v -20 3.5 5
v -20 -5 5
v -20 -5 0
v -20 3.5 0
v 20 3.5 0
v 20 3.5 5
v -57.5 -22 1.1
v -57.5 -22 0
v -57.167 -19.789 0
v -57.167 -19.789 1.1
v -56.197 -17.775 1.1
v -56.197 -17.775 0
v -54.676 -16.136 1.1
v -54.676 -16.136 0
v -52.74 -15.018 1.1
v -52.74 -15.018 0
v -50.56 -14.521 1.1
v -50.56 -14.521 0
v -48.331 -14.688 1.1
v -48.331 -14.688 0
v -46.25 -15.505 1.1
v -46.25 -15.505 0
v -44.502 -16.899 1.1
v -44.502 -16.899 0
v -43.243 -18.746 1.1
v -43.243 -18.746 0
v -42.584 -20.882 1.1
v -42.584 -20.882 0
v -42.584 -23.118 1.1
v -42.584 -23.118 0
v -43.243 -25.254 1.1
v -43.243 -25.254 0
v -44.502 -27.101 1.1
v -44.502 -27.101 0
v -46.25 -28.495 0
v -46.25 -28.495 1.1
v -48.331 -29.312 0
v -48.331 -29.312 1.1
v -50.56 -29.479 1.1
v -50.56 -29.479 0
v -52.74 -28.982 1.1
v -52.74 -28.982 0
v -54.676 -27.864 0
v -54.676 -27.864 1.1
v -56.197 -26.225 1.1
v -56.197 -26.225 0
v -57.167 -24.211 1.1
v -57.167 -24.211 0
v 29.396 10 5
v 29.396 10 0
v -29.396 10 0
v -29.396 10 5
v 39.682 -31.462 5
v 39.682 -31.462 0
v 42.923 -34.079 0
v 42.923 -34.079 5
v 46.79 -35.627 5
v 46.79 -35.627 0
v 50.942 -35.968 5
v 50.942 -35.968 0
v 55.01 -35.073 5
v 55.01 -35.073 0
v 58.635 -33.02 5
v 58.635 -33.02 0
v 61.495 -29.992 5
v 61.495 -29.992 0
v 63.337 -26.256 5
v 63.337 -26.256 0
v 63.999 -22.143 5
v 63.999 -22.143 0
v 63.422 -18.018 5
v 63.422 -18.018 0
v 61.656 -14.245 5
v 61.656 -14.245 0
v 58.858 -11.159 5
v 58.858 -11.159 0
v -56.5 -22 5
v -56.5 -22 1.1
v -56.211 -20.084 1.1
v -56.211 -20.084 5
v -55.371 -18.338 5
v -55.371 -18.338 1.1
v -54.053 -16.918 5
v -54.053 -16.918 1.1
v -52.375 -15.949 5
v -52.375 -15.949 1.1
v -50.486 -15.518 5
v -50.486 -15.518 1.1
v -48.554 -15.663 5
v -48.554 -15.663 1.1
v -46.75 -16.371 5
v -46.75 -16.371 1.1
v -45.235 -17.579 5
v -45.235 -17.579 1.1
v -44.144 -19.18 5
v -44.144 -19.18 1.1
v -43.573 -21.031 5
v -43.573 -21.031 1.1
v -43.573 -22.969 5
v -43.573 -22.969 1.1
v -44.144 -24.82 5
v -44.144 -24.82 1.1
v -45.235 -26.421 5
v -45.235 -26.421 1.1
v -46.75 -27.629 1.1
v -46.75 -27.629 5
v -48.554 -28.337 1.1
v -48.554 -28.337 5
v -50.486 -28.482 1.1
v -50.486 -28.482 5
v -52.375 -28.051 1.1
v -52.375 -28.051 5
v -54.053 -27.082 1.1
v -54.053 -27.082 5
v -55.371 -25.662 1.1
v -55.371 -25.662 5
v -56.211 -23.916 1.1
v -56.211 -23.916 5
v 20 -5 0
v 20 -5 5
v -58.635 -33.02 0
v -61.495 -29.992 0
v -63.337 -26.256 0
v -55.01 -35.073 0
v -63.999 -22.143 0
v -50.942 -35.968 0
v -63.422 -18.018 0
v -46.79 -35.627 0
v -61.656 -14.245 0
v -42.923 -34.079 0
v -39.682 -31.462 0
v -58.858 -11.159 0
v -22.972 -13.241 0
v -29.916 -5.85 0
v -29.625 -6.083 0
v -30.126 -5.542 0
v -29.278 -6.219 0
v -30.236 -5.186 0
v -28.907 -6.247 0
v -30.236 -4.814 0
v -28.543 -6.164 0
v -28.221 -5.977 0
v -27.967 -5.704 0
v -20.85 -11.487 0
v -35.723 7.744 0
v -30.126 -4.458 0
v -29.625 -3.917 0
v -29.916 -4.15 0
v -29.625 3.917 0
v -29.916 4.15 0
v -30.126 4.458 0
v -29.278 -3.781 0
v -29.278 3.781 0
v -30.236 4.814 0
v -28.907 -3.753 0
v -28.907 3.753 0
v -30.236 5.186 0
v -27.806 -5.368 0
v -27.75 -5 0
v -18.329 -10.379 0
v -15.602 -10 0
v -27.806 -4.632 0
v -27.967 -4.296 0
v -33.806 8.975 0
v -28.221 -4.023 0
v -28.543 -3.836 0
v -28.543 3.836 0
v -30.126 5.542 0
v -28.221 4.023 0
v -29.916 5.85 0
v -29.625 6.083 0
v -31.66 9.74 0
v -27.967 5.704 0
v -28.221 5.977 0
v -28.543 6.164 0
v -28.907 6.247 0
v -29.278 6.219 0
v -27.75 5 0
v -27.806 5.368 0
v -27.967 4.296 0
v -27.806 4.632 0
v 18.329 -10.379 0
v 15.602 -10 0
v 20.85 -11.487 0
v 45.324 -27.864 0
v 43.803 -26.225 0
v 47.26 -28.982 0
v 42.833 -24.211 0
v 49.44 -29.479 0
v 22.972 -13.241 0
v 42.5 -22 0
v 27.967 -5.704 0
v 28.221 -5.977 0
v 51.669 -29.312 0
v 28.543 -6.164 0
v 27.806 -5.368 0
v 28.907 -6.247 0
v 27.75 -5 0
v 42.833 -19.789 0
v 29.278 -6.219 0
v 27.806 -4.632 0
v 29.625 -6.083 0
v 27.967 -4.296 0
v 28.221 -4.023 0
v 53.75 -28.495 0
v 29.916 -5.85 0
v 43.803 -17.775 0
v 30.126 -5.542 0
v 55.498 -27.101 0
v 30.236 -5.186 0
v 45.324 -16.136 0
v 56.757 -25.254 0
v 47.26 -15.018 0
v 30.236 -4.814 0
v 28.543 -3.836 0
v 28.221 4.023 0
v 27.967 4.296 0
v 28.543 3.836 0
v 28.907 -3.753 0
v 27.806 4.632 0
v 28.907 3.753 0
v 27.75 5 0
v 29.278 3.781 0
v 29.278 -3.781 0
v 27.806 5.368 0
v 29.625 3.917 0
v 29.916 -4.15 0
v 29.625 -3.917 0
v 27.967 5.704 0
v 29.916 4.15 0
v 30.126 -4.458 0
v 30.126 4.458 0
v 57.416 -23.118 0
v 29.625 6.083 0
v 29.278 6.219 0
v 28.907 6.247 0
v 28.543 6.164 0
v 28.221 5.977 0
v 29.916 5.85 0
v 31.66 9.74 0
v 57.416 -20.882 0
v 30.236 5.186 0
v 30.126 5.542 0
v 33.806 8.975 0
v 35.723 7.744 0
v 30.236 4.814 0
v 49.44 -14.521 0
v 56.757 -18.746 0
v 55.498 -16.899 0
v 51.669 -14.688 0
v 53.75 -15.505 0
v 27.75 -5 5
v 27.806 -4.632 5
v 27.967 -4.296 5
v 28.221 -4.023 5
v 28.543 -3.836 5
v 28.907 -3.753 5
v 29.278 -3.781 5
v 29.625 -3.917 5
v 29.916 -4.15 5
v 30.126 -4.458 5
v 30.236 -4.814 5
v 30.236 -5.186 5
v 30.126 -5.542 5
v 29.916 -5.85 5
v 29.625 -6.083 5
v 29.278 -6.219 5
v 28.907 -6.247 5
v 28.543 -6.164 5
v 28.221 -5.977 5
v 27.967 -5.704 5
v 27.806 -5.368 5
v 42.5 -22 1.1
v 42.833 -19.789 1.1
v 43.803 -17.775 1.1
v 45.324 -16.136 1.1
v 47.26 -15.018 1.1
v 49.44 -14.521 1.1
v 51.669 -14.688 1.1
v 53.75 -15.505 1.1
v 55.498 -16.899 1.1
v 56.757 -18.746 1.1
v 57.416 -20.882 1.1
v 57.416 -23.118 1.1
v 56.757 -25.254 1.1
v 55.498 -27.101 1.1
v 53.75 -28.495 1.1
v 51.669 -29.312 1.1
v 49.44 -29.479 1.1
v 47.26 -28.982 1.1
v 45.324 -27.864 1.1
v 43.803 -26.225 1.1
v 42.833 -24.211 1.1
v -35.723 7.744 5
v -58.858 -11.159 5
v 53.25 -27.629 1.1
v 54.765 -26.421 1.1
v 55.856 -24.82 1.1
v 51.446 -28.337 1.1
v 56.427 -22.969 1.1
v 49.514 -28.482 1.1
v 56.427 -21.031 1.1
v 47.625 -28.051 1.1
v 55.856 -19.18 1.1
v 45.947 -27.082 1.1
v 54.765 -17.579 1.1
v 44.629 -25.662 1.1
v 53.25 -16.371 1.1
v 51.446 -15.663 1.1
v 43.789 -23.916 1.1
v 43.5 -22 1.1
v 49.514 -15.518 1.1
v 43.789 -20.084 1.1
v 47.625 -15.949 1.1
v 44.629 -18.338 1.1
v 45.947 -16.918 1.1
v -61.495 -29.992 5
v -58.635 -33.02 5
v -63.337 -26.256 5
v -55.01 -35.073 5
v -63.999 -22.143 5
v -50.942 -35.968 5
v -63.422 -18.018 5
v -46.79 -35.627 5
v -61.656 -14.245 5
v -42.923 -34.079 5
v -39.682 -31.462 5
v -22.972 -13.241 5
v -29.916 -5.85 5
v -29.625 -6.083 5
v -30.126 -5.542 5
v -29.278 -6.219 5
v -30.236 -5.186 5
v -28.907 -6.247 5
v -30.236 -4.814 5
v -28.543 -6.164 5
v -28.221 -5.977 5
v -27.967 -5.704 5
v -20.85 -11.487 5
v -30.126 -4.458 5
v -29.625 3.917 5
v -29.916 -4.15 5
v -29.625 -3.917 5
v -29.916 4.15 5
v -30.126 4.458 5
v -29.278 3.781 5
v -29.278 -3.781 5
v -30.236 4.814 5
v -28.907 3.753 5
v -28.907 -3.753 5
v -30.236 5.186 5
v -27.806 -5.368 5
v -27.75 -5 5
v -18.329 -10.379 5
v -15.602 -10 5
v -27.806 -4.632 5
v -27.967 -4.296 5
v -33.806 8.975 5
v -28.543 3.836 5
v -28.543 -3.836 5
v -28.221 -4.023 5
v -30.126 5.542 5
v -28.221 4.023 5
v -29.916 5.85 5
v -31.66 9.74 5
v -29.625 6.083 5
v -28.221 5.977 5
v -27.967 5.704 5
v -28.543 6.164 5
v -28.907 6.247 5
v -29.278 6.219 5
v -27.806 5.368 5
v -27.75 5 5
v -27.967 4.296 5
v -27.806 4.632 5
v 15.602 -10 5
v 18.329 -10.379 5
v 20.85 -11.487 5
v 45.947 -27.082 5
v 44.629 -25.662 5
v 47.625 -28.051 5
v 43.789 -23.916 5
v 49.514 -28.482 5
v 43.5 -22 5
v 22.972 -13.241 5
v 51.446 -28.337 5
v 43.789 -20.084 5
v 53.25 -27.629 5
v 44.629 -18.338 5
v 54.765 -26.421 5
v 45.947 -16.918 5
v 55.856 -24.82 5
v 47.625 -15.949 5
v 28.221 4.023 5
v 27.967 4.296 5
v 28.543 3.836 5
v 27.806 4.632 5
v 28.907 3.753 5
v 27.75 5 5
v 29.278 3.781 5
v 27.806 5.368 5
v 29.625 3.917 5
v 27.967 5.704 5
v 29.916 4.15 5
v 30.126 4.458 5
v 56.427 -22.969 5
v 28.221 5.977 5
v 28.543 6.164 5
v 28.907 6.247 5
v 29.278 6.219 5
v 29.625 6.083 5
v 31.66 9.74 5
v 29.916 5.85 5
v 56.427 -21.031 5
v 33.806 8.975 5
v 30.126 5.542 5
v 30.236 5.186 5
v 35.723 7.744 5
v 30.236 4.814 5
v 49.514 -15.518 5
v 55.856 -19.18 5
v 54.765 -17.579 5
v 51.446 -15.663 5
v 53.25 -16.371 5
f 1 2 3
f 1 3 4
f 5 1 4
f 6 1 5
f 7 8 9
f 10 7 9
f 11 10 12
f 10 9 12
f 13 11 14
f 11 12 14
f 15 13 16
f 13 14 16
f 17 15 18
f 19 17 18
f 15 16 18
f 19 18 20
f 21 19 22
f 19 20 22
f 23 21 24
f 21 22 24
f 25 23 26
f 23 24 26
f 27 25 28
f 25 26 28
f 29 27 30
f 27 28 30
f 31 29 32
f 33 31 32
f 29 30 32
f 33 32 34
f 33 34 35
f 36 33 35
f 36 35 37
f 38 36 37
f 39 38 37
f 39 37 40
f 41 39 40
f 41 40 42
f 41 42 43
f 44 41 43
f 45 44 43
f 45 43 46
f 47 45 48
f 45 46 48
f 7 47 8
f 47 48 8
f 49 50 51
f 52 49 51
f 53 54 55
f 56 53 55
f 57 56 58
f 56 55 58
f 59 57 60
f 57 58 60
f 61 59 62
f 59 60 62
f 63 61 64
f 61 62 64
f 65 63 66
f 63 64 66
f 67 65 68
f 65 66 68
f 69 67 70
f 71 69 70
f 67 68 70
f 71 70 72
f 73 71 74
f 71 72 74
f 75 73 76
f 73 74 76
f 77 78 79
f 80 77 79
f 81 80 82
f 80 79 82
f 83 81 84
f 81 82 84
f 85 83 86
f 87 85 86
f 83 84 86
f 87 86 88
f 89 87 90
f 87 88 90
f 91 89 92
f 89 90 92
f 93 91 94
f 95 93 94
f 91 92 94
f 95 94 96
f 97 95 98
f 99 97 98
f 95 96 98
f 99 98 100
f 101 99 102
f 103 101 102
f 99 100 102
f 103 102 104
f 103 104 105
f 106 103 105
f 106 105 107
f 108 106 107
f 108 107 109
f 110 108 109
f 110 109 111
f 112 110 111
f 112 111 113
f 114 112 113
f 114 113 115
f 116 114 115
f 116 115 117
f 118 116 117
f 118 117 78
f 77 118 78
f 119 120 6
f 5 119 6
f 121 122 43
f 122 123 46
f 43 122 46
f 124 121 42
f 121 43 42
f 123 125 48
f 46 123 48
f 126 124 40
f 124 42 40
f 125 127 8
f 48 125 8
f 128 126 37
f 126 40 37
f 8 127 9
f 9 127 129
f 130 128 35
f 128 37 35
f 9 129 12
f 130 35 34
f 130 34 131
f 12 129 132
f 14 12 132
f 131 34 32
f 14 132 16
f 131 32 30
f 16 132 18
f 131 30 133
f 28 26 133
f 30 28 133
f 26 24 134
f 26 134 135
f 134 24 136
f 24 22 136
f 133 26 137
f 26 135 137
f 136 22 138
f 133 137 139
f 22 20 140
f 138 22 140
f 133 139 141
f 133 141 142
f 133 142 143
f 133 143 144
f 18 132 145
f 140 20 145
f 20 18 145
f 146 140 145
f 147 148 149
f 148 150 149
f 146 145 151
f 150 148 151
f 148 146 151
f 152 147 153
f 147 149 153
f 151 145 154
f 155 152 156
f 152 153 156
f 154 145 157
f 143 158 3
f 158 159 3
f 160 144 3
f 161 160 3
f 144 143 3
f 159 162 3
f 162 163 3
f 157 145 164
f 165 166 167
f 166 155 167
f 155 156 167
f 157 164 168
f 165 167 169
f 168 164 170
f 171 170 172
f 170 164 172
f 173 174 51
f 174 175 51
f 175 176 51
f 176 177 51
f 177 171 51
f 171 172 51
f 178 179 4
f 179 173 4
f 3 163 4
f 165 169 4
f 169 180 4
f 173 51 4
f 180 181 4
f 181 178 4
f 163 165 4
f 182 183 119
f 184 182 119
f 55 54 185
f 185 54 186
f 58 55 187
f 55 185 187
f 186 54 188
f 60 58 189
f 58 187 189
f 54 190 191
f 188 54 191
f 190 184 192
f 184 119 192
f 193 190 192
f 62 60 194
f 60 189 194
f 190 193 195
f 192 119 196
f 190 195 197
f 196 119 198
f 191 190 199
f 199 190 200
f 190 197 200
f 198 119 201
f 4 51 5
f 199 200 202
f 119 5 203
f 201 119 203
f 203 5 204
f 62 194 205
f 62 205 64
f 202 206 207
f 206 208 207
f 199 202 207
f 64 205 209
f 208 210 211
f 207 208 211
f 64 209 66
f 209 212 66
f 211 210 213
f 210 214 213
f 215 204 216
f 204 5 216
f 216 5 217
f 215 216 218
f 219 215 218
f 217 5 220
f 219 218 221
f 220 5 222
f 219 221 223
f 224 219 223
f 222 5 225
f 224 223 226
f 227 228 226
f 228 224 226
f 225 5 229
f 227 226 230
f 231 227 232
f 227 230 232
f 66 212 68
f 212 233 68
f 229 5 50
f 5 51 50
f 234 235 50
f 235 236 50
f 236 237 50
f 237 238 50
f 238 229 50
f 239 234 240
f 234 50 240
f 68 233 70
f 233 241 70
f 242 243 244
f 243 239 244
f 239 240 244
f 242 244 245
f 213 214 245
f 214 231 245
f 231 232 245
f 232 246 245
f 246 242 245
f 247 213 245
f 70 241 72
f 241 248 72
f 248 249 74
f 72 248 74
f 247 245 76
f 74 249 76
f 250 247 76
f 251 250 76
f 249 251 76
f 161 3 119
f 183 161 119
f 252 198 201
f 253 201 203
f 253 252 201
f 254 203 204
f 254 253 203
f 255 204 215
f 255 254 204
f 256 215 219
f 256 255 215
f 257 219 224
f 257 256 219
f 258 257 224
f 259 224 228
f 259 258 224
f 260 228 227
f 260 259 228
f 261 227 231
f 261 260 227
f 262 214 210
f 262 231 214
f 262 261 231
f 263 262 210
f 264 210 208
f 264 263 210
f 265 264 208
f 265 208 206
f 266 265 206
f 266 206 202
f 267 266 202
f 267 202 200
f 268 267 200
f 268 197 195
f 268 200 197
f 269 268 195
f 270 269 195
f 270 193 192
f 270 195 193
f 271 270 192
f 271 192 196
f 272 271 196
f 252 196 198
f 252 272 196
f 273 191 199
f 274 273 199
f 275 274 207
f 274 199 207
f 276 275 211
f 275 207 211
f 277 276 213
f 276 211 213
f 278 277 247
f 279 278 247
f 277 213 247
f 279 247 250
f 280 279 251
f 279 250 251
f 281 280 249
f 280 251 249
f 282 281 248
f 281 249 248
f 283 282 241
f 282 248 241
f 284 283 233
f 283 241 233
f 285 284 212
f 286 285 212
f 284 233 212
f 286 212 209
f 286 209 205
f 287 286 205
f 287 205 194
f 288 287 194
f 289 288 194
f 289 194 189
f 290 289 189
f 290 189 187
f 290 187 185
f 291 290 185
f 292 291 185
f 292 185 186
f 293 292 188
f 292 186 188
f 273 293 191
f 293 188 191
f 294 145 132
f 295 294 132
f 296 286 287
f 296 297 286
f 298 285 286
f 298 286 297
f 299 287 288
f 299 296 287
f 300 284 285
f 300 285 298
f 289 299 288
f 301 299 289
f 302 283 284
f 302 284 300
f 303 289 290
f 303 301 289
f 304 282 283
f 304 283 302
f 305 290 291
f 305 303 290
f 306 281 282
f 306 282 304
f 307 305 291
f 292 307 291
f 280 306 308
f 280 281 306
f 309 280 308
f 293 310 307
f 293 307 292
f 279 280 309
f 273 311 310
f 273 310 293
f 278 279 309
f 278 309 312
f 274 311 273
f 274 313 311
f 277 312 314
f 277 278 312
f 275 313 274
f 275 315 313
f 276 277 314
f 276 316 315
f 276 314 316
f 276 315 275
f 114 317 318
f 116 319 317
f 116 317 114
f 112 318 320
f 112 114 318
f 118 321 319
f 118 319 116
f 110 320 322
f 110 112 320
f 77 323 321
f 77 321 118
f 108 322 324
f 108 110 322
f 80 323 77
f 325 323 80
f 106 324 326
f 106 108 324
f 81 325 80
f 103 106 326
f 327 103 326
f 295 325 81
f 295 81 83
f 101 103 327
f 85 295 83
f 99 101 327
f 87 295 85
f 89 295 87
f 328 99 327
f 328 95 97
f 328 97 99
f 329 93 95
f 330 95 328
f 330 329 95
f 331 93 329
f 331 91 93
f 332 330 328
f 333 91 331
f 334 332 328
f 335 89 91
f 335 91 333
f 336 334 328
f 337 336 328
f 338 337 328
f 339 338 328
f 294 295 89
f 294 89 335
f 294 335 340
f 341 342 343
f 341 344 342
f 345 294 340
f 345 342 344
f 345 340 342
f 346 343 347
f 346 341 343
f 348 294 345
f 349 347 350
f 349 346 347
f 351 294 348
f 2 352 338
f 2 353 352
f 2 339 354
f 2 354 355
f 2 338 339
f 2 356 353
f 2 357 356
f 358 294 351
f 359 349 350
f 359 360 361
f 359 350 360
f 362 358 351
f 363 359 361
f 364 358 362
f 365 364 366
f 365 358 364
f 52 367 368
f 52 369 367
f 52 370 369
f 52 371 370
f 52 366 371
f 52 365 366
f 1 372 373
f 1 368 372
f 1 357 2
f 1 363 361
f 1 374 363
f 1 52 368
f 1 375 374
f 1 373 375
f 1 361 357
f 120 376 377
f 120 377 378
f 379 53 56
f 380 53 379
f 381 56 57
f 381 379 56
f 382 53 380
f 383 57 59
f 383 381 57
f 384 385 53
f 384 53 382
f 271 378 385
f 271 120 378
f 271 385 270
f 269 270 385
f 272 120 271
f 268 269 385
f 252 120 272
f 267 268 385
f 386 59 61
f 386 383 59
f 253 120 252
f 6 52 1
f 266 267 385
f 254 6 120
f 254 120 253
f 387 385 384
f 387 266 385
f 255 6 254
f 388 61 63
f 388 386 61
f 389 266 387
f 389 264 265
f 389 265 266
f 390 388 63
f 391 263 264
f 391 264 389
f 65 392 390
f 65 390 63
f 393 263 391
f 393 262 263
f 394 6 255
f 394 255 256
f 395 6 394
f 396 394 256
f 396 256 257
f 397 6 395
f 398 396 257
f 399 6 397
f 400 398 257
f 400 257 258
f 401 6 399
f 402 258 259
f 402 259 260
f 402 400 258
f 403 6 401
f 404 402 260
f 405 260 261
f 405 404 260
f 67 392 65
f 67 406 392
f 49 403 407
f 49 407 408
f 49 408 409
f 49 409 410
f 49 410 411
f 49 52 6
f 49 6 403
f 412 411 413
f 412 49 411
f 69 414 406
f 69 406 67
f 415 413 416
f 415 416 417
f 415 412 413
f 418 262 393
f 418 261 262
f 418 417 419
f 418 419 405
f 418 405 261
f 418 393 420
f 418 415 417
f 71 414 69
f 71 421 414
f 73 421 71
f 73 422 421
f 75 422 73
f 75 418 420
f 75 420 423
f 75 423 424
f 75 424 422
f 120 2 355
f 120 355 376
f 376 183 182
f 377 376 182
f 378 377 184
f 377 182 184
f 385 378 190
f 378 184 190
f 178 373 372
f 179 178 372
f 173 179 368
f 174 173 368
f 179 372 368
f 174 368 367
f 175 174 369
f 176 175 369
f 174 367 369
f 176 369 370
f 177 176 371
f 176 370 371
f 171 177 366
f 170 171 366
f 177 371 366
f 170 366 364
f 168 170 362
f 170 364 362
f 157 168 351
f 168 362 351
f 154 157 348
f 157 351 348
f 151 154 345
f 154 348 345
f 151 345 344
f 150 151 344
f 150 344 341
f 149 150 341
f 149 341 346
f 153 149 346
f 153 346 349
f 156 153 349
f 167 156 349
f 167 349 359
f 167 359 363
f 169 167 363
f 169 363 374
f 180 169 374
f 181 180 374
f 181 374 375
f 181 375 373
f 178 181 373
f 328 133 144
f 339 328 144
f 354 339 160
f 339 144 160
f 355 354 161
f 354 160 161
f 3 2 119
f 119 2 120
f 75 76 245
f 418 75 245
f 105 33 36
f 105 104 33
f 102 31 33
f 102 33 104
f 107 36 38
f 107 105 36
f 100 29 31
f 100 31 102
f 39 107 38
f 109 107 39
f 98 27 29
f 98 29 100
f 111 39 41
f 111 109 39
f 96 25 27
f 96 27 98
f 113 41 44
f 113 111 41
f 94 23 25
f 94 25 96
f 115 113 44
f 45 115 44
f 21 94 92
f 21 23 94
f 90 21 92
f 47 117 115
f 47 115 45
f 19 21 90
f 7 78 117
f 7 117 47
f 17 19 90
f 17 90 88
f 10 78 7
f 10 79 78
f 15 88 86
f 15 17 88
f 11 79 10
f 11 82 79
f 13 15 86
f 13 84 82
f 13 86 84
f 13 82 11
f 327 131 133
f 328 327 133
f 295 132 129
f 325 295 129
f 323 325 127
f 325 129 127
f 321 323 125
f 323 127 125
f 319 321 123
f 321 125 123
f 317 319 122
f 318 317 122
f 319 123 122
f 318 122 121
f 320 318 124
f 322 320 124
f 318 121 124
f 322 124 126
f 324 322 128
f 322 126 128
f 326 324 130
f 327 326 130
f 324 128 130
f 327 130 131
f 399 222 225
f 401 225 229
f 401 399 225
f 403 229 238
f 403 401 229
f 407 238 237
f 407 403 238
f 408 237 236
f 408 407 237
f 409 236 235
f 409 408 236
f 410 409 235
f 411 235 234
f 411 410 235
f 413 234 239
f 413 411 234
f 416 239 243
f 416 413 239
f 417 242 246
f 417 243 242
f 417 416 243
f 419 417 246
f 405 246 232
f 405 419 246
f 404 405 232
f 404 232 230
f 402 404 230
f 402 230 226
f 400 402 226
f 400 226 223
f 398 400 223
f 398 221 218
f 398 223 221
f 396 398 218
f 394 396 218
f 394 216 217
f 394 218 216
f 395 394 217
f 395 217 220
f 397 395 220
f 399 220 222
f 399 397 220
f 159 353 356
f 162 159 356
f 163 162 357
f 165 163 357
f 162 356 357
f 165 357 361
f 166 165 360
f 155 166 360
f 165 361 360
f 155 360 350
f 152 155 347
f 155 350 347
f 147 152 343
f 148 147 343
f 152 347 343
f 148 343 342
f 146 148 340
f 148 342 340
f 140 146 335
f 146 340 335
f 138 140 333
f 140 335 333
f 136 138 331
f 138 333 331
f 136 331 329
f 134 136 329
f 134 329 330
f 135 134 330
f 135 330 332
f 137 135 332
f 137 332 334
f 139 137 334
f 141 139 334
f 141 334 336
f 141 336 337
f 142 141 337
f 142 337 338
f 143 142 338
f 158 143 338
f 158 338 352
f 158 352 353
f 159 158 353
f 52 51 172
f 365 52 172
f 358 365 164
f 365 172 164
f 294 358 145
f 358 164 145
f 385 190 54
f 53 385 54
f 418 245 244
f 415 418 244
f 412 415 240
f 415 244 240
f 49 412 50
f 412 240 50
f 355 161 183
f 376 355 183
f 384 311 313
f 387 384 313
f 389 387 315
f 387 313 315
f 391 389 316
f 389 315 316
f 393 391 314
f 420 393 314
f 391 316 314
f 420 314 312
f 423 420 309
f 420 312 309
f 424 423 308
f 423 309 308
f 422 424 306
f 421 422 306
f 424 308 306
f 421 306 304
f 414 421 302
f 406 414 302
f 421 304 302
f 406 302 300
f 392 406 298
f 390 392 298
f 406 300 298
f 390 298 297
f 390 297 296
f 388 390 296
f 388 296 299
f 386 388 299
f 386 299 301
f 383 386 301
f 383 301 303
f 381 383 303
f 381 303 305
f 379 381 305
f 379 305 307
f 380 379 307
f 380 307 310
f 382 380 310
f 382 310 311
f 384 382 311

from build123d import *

# Parameters (mm, degrees)
EXTRUDE_1_DEPTH     = 5
SKETCH_4_W          = 40
SKETCH_4_H          = 8.5
CUT_EXTRUDE_1_DEPTH = 5
SKETCH_5_R          = 1.25
CUT_EXTRUDE_2_DEPTH = 7
SKETCH_9_R          = 6.5
CUT_EXTRUDE_4_DEPTH = 5
SKETCH_10_R         = 7.5
CUT_EXTRUDE_5_DEPTH = 1.1


with BuildPart() as part:
    # 草图3 → 凸台-拉伸1 (new body)
    with BuildSketch(Plane.XY):
        with BuildLine():
            Line((-35.723215038, 7.743839121), (-58.858024221, -11.158625231))
            ThreePointArc((-58.858024221, -11.158625231), (-60.178030432, -31.612892204), (-39.681768347, -31.462245799))
            Line((-39.681768347, -31.462245799), (-22.972363252, -13.241253001))
            ThreePointArc((-22.972363252, -13.241253001), (-19.627898346, -10.846108205), (-15.602197786, -10))
            Line((-15.602197786, -10), (15.602197786, -10))
            ThreePointArc((15.602197786, -10), (19.627898346, -10.846108205), (22.972363252, -13.241253001))
            Line((22.972363252, -13.241253001), (39.681768347, -31.462245799))
            ThreePointArc((39.681768347, -31.462245799), (60.178030432, -31.612892204), (58.858024221, -11.158625231))
            Line((58.858024221, -11.158625231), (35.723215038, 7.743839121))
            ThreePointArc((35.723215038, 7.743839121), (32.754745755, 9.419086771), (29.39605488, 10))
            Line((29.39605488, 10), (-29.39605488, 10))
            ThreePointArc((-29.39605488, 10), (-32.754745755, 9.419086771), (-35.723215038, 7.743839121))
        make_face()
    extrude(amount=EXTRUDE_1_DEPTH)

    # 草图4 → 切除-拉伸1 (cut)
    with BuildSketch(Plane.XY.offset(5)):
        with Locations((0, -0.75)):
            Rectangle(SKETCH_4_W, SKETCH_4_H)
    extrude(amount=-CUT_EXTRUDE_1_DEPTH, mode=Mode.SUBTRACT)

    # 草图5 → 切除-拉伸2 (cut)
    with BuildSketch(Plane.XY.offset(5)):
        with Locations((-29, -5)):
            Circle(SKETCH_5_R)
        with Locations((-29, 5)):
            Circle(SKETCH_5_R)
    cut_extrude_2 = extrude(amount=-CUT_EXTRUDE_2_DEPTH, mode=Mode.SUBTRACT)

    # 草图9 → 切除-拉伸4 (cut)
    with BuildSketch(Plane(origin=(0, 0, 0), x_dir=(-1, 0, 0), z_dir=(0, 0, -1))):
        with Locations((-50, -22)):
            Circle(SKETCH_9_R)
        with Locations((50, -22)):
            Circle(SKETCH_9_R)
    extrude(amount=-CUT_EXTRUDE_4_DEPTH, mode=Mode.SUBTRACT)

    # 草图10 → 切除-拉伸5 (cut)
    with BuildSketch(Plane(origin=(0, 0, 0), x_dir=(-1, 0, 0), z_dir=(0, 0, -1))):
        with Locations((-50, -22)):
            Circle(SKETCH_10_R)
        with Locations((50, -22)):
            Circle(SKETCH_10_R)
    extrude(amount=-CUT_EXTRUDE_5_DEPTH, mode=Mode.SUBTRACT)

    # 镜向1: 切除-拉伸2 across plane
    add(cut_extrude_2.mirror(Plane.ZY), mode=Mode.SUBTRACT)


solid = part.part
